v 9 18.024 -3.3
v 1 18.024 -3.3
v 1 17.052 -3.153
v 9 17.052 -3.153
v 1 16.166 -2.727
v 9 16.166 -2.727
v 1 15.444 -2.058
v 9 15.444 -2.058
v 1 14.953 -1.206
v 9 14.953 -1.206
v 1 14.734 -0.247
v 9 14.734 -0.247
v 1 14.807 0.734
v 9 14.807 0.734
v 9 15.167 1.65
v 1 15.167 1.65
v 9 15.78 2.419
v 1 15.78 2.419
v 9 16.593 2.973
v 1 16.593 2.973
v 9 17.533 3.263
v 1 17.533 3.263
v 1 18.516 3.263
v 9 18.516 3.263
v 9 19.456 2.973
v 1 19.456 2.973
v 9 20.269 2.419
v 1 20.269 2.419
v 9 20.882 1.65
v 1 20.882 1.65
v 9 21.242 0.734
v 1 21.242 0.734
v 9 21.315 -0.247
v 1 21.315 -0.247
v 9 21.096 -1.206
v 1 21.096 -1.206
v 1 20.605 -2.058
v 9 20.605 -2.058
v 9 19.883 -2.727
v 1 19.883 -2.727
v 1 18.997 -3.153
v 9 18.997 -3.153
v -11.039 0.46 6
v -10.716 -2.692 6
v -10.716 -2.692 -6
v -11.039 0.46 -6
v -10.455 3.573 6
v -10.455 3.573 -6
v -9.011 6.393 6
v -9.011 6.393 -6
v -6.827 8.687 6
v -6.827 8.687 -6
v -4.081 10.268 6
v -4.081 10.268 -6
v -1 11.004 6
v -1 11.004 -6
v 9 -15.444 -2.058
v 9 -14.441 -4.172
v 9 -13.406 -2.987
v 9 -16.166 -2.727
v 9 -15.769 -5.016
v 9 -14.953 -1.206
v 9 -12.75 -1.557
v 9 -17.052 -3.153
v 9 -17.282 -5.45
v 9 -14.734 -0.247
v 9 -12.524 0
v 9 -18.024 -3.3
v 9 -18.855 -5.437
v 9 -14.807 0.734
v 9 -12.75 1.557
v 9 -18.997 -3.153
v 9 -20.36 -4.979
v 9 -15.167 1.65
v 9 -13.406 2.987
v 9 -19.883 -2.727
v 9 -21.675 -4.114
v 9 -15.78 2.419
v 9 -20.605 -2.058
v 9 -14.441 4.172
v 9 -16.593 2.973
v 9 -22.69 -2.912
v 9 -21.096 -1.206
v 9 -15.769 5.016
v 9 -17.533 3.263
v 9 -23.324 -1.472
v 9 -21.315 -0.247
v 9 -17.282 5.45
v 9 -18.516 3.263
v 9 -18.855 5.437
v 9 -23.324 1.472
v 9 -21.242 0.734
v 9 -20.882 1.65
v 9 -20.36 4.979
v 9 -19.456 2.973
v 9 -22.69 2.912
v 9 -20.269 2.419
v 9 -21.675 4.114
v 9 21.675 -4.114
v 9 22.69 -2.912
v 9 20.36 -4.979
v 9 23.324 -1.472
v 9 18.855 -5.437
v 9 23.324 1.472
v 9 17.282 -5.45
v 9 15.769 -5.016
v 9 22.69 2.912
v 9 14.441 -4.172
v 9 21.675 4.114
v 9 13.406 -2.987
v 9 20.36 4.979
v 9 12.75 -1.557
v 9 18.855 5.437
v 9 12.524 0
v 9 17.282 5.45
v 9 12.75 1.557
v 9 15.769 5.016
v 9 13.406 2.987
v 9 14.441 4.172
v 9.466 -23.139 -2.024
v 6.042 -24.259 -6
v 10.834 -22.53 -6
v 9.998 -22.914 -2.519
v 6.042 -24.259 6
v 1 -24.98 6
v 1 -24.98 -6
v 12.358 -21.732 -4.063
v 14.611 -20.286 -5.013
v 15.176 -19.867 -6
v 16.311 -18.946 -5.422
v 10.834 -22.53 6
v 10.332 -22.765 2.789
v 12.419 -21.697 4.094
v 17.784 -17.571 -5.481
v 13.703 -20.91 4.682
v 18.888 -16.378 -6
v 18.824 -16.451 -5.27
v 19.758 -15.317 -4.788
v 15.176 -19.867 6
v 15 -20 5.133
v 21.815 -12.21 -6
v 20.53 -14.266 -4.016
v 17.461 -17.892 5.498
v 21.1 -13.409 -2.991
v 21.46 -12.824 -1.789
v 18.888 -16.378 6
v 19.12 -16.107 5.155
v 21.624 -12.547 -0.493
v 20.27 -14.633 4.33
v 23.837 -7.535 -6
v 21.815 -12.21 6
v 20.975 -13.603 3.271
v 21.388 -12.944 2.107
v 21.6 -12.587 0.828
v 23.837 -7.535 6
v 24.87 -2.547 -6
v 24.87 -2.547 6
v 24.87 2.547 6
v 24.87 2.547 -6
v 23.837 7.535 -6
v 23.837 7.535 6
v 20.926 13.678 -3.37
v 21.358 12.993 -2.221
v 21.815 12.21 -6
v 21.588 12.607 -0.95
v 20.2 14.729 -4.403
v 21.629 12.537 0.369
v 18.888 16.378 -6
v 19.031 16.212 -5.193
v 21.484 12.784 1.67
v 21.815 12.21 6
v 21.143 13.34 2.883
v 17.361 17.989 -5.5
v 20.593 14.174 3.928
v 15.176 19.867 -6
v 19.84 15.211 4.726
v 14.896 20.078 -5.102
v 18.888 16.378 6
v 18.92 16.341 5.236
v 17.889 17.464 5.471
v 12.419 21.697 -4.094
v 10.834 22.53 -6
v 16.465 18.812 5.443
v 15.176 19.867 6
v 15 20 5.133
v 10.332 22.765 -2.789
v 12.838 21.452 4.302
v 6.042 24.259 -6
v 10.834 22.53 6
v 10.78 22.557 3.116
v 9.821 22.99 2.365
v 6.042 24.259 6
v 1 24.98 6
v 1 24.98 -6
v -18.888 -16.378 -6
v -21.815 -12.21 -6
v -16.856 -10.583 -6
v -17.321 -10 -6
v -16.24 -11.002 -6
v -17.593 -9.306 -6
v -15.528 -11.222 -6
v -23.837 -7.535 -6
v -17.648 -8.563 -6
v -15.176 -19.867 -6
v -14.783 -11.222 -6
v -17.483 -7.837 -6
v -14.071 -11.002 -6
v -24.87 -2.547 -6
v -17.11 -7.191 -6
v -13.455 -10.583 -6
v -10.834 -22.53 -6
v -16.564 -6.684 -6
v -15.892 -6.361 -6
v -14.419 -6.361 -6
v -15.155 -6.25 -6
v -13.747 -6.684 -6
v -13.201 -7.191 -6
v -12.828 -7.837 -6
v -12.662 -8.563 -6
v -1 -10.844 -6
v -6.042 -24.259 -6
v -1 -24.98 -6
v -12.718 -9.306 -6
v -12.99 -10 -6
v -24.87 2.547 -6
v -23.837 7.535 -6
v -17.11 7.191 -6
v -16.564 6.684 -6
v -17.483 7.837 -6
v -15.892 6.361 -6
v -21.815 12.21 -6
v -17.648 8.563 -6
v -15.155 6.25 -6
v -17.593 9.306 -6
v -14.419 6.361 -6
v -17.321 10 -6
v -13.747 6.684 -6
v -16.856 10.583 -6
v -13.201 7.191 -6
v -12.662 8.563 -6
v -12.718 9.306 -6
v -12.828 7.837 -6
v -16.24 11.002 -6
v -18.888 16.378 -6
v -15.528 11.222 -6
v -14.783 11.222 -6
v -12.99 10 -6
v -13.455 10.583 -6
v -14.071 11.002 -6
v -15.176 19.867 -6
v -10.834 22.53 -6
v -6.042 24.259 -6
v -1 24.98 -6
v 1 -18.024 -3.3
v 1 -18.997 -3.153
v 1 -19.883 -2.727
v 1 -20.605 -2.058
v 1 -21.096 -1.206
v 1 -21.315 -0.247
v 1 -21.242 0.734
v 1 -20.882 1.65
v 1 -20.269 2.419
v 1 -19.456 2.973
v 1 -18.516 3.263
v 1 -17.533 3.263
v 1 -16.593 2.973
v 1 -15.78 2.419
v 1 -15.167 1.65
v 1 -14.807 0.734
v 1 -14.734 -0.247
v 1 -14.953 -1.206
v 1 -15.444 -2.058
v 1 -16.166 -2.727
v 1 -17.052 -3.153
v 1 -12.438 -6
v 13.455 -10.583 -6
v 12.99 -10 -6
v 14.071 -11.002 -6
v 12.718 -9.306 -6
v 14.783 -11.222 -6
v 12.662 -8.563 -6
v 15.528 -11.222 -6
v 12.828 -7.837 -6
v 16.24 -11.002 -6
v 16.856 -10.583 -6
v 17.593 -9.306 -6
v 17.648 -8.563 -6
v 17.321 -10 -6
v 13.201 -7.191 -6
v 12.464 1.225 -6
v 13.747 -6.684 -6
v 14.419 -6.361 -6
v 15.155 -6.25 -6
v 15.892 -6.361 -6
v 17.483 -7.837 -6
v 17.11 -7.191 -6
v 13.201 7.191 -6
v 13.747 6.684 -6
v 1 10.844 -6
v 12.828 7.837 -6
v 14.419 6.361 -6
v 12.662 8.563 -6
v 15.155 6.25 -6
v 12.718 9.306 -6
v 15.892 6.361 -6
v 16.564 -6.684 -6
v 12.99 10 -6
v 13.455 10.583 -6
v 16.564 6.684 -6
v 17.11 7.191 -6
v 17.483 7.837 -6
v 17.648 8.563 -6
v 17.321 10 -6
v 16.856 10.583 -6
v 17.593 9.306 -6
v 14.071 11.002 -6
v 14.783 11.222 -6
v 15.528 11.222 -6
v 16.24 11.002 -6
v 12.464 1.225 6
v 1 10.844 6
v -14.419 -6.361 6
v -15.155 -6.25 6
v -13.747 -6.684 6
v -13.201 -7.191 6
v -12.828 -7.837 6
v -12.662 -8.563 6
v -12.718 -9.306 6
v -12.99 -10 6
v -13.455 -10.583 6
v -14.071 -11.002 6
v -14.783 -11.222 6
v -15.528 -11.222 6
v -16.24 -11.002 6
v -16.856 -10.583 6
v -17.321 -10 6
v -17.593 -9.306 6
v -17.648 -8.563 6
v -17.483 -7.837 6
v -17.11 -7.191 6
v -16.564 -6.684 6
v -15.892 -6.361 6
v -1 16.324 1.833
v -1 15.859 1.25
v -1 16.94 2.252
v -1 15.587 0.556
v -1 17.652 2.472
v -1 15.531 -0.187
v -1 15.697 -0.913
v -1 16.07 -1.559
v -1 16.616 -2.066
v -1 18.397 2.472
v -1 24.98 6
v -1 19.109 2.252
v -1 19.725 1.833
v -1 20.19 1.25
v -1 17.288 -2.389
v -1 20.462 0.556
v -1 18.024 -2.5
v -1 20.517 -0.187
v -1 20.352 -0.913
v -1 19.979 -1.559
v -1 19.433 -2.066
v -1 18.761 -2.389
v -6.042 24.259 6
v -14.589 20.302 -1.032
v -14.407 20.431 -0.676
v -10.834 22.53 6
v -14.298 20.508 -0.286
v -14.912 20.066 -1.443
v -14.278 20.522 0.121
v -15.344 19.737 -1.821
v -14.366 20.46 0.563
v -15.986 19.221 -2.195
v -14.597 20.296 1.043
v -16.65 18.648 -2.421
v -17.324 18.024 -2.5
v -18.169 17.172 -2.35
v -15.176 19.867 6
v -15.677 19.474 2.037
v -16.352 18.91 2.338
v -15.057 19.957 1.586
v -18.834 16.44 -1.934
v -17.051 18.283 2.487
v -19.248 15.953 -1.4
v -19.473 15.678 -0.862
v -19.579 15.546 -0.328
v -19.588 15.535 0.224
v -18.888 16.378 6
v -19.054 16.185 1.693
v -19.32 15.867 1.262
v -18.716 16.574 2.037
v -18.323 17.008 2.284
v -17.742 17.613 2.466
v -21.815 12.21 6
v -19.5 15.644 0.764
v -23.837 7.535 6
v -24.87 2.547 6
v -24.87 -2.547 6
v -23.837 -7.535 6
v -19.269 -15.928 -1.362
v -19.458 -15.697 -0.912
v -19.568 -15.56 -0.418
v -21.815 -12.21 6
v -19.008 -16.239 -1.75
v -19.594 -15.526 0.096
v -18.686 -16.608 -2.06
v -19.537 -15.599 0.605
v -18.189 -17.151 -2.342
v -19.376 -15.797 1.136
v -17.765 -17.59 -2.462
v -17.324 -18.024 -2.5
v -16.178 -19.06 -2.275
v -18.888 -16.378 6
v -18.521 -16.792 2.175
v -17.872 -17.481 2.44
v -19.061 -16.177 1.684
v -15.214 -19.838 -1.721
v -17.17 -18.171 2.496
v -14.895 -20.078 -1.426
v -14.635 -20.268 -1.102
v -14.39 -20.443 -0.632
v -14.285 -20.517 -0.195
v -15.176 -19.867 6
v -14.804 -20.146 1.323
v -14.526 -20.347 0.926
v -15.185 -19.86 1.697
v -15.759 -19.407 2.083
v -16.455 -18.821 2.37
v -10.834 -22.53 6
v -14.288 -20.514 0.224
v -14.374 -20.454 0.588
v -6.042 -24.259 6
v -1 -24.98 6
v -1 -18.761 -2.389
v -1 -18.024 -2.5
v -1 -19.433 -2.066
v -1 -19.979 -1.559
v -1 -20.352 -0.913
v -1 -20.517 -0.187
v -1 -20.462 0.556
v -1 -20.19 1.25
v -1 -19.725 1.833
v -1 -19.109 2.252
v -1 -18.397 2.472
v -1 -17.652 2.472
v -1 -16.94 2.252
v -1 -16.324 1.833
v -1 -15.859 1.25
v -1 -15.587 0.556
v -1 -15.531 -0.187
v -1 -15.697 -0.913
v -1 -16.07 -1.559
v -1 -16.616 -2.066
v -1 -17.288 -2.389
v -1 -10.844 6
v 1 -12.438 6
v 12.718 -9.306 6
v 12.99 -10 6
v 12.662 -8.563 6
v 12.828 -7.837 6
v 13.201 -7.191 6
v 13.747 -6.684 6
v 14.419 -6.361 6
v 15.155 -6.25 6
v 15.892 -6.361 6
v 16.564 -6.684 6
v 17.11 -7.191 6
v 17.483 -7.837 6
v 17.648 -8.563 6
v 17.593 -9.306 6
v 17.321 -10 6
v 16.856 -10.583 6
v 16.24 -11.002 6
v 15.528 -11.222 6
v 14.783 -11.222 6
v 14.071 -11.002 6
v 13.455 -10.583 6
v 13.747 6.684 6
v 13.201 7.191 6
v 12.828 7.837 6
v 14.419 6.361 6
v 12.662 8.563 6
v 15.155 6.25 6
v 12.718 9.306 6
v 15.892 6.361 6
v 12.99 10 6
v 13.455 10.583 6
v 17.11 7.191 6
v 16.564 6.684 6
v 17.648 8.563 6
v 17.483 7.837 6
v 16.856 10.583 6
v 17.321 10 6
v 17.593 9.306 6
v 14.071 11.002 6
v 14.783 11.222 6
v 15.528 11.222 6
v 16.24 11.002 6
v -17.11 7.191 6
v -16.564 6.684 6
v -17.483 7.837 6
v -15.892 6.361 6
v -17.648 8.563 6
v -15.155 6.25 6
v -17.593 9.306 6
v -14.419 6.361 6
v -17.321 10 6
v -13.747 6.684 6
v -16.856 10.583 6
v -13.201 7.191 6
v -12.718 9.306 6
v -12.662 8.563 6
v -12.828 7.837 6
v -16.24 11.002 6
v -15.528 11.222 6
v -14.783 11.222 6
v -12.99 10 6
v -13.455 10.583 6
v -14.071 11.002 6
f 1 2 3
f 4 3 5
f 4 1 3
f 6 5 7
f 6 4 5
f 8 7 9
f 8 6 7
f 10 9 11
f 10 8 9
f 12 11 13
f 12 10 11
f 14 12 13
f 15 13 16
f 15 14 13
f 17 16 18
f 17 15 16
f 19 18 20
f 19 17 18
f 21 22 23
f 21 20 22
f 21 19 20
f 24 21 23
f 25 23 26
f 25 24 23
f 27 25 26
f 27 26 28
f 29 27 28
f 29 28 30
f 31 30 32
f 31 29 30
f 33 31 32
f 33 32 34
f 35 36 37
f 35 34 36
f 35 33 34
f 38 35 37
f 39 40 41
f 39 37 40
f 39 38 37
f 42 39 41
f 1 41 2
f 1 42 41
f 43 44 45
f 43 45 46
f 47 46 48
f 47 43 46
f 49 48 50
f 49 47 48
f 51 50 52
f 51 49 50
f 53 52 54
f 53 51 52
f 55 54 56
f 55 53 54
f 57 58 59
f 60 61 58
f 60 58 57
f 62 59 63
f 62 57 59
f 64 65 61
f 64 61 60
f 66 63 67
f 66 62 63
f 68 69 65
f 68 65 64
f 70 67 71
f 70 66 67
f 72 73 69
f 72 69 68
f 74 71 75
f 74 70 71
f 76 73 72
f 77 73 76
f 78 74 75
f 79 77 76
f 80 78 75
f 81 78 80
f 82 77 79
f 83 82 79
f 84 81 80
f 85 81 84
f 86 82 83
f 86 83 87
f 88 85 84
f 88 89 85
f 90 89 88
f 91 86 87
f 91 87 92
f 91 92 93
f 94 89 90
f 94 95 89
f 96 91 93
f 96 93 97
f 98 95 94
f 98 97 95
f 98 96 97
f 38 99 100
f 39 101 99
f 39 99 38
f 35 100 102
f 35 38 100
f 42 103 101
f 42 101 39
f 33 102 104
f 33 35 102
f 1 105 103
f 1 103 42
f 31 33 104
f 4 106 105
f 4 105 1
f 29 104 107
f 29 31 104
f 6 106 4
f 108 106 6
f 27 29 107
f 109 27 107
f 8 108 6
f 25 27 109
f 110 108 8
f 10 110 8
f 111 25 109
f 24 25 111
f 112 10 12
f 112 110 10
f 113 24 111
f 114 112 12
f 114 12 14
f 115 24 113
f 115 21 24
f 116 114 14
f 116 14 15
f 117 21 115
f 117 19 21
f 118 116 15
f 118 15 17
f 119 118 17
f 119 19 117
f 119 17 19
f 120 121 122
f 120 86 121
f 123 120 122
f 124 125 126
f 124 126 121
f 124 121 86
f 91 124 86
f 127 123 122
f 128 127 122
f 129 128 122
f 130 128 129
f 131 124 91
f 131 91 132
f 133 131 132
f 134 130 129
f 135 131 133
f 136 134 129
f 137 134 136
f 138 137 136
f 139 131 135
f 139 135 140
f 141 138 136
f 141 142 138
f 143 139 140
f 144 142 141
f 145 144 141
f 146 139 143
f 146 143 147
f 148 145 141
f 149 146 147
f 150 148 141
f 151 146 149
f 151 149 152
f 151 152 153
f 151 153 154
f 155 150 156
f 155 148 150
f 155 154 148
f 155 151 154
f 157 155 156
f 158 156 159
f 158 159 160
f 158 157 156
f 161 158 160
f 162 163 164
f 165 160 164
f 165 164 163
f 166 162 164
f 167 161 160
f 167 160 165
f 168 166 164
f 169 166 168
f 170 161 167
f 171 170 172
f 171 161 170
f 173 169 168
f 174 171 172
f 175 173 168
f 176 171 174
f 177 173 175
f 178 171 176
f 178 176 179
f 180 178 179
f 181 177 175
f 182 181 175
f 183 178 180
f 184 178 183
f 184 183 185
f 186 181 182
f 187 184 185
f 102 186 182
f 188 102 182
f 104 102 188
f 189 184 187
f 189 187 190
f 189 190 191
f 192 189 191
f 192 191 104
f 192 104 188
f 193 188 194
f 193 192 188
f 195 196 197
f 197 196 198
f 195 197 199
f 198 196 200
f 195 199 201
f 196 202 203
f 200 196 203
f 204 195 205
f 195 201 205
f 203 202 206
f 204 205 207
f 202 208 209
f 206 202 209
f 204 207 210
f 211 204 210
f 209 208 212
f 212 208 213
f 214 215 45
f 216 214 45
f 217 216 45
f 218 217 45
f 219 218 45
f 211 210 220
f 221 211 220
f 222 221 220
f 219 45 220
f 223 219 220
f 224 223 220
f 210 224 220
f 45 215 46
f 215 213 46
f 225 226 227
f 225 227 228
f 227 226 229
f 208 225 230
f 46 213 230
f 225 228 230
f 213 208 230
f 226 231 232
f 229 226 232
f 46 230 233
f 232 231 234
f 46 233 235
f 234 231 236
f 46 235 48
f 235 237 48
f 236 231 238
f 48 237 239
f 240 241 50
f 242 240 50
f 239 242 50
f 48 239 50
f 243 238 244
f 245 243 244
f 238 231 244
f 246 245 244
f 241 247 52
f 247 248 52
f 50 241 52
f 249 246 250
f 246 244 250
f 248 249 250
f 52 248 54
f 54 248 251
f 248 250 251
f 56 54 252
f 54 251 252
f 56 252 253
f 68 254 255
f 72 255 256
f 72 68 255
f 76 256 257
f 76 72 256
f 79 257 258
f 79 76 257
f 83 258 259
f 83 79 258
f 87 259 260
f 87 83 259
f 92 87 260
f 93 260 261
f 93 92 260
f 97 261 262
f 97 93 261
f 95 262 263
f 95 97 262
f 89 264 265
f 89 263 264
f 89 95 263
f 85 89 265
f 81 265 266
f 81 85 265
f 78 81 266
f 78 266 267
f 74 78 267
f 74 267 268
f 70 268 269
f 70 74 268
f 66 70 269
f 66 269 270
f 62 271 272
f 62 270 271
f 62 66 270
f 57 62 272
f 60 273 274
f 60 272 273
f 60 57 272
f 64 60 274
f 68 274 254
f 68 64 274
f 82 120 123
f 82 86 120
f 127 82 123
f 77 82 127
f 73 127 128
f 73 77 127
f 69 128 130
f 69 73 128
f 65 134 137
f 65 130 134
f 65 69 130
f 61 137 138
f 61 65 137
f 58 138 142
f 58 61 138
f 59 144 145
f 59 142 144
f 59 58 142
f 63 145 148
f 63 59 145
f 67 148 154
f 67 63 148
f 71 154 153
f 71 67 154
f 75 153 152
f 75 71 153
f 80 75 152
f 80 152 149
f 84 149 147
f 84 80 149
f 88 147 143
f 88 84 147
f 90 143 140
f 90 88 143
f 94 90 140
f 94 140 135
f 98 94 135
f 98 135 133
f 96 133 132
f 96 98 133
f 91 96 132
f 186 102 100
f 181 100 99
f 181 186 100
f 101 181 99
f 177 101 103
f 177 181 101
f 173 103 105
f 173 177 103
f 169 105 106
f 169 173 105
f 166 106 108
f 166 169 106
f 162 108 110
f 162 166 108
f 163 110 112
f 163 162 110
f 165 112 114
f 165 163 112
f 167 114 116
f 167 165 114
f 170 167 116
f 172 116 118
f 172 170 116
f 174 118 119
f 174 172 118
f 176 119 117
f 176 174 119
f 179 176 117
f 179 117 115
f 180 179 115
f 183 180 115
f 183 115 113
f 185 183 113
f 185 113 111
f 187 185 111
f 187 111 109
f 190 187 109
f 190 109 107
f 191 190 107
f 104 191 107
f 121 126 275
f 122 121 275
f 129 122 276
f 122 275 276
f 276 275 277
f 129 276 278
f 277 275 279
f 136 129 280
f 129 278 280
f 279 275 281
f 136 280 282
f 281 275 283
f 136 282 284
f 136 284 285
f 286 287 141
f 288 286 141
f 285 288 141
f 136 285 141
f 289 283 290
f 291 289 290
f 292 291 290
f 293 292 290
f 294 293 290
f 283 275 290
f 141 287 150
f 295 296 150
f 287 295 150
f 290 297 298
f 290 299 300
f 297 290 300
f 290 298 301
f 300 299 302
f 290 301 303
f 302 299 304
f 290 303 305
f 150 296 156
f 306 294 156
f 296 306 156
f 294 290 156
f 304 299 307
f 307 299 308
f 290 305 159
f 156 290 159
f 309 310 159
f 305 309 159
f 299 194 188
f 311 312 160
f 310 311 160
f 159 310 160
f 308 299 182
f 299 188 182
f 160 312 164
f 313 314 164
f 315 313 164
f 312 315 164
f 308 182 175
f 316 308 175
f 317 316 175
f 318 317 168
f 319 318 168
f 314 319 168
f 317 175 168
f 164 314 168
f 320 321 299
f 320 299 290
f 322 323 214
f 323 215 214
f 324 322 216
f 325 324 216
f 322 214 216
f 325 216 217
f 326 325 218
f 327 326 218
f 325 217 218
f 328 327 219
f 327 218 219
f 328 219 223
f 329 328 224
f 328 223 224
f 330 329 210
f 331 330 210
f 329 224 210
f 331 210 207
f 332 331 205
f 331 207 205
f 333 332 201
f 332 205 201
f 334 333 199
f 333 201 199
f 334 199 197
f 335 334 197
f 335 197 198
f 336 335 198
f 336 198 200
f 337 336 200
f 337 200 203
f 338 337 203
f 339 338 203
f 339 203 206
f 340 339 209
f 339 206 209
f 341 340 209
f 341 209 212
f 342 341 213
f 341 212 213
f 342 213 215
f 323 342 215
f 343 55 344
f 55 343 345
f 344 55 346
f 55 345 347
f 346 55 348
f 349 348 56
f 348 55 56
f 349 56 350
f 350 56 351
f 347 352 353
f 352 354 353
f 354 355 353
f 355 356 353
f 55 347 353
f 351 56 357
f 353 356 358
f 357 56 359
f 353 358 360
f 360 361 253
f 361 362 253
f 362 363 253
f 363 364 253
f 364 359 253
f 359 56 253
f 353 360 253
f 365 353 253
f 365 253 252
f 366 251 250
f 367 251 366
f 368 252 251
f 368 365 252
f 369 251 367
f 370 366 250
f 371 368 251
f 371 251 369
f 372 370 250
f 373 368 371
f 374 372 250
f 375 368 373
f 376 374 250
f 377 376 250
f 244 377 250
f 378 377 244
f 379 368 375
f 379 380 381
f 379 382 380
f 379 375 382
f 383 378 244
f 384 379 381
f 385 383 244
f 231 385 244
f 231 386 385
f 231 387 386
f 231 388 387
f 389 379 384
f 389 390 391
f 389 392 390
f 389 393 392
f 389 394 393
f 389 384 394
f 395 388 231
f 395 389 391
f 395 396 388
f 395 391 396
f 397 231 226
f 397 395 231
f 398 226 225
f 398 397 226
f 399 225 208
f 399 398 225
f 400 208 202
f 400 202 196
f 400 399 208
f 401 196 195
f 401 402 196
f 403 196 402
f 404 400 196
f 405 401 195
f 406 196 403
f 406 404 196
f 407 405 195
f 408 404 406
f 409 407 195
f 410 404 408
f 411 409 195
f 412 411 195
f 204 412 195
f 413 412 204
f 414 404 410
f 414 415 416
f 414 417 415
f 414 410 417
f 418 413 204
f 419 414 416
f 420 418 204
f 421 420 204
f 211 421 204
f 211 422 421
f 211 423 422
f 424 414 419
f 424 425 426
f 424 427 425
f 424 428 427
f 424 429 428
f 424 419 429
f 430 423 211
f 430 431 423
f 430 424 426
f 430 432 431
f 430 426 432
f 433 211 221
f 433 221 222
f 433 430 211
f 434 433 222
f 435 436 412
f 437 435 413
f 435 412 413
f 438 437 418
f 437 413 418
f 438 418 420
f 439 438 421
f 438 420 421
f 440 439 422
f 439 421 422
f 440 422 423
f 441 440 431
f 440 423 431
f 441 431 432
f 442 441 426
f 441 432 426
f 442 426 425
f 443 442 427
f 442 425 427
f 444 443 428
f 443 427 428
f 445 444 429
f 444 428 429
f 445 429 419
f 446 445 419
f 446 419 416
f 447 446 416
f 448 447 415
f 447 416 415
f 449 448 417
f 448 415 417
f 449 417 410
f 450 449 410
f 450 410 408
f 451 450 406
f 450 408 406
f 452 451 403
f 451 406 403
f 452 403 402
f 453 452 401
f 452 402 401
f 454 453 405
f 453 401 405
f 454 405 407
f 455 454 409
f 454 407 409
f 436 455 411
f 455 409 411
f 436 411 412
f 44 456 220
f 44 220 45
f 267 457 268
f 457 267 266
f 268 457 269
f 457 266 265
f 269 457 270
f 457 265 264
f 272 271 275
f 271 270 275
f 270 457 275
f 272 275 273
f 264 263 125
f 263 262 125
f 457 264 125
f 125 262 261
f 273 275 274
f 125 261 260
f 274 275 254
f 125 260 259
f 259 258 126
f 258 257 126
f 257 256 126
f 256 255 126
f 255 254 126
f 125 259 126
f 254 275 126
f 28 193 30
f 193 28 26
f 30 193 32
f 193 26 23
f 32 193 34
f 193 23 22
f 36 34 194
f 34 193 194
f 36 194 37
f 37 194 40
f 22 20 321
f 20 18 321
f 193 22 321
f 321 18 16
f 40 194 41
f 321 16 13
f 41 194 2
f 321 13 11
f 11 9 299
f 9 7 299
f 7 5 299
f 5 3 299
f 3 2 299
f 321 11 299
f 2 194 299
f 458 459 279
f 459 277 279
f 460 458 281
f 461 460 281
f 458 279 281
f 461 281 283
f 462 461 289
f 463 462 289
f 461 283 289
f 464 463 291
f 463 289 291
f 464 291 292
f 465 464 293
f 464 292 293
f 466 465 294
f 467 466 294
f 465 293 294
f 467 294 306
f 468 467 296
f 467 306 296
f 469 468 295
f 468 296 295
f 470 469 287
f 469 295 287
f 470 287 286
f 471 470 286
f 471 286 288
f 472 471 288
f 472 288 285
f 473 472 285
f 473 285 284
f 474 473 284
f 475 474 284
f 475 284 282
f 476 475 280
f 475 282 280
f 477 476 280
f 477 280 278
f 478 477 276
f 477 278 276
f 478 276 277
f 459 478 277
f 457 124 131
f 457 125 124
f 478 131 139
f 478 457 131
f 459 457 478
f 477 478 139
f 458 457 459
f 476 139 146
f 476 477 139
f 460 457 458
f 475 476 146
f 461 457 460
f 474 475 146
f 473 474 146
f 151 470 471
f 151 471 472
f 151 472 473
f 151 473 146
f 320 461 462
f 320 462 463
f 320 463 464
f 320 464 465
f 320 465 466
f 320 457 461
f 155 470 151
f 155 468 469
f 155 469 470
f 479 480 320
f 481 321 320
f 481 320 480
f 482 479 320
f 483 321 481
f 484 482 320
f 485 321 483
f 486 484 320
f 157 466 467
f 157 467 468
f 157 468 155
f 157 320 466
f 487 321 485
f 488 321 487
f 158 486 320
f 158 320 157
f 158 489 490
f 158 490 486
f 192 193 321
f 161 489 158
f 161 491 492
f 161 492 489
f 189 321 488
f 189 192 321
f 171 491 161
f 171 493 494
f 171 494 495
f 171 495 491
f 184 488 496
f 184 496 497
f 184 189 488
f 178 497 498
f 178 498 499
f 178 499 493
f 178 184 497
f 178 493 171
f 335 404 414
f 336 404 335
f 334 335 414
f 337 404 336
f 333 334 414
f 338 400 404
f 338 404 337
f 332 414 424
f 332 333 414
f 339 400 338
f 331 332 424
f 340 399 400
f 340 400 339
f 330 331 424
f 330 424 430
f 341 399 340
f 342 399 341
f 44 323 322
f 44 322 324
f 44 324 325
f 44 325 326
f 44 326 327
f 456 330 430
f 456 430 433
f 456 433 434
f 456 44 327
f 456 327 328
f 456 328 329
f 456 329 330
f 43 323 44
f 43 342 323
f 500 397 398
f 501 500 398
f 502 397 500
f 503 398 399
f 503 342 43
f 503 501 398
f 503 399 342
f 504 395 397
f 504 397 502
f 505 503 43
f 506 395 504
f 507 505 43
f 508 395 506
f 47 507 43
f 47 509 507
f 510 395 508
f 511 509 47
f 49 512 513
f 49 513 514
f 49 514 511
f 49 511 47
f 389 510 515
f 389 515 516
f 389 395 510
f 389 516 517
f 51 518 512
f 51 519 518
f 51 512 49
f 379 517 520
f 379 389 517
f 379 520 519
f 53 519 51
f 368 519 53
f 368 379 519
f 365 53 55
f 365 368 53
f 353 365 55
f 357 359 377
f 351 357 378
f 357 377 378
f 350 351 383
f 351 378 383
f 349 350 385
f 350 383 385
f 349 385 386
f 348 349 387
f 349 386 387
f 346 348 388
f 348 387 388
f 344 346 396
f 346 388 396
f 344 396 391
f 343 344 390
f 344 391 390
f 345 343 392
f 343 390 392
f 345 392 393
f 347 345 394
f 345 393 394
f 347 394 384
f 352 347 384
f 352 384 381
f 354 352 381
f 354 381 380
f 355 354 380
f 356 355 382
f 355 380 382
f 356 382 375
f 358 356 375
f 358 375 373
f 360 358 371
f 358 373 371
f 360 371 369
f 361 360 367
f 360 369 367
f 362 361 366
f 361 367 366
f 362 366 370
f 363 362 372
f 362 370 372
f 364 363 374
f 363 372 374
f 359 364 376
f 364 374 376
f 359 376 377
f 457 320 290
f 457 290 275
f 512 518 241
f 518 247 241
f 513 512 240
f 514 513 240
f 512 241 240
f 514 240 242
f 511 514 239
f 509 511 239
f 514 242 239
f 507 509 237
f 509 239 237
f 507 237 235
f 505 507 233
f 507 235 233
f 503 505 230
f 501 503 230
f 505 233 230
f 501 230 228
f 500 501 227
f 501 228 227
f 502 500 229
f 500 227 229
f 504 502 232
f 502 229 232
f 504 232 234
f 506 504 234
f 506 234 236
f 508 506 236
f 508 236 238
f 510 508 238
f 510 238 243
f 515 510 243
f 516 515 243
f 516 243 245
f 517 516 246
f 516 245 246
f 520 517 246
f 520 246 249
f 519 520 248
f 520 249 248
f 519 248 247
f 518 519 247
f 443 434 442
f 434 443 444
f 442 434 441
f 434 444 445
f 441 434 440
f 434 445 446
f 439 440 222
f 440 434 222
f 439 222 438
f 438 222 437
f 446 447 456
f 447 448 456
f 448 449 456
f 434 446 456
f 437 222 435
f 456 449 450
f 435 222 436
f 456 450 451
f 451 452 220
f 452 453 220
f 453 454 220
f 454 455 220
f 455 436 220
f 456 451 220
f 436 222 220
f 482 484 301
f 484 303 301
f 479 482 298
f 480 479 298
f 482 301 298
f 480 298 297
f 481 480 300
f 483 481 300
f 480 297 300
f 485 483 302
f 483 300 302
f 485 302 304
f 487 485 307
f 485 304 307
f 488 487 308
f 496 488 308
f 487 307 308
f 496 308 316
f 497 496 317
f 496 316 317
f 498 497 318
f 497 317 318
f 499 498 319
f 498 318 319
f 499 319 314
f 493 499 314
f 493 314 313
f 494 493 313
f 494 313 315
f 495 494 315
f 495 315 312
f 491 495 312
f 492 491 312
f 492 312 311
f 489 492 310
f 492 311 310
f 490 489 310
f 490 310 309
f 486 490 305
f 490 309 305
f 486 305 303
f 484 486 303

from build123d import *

# Parameters (mm, degrees)
SKETCH_7_R                  = 25
EXTRUDE_1_DEPTH             = 6
CUT_EXTRUDE_1_DEPTH         = 36.860842154
CUT_EXTRUDE_1_DEPTH_BACK    = 36.860842154
SKETCH_18_W                 = 2.5
SKETCH_18_H                 = 12
PATTERN_CIRCULAR_2_COUNT    = 6
HOLE_WIZARD_M6_1_AT_2_COUNT = 2
HOLE_WIZARD_M6_1_AT_2_PITCH = 36.048949672
SKETCH_29_W                 = 2.5
SKETCH_29_H                 = 40
M6X1_0_3_AT_2_COUNT         = 2
M6X1_0_3_AT_2_PITCH         = 36.048949672
SKETCH_30_R                 = 5.5
CUT_EXTRUDE_2_DEPTH         = 48.539457445


with BuildPart() as part:
    # 스케치7 → 보스-돌출1 (new, symmetric)
    with BuildSketch(Plane.XY):
        Circle(SKETCH_7_R)
        with BuildLine():
            Line((12.464303027, 1.224603167), (0.958404813, -12.487592365))
            Line((0.958404813, -12.487592365), (-10.7161125, -2.691509193))
            ThreePointArc((-10.7161125, -2.691509193), (-8.463986498, 7.102127949), (0.789785713, 11.020686339))
            Line((0.789785713, 11.020686339), (12.464303027, 1.224603167))
        make_face(mode=Mode.SUBTRACT)
    extrude(amount=EXTRUDE_1_DEPTH, both=True)

    # 스케치19 → 컷-돌출1 (cut, two sides: drawn at the far end of the back side and taken through both)
    with BuildSketch(Plane.XY.offset(-CUT_EXTRUDE_1_DEPTH_BACK)):
        with BuildLine():
            Line((1, 24.979991994), (1, -24.979991994))
            ThreePointArc((1, -24.979991994), (0, -25), (-1, -24.979991994))
            Line((-1, -24.979991994), (-1, 24.979991994))
            ThreePointArc((-1, 24.979991994), (0, 25), (1, 24.979991994))
        make_face()
    extrude(amount=CUT_EXTRUDE_1_DEPTH + CUT_EXTRUDE_1_DEPTH_BACK, mode=Mode.SUBTRACT)


with BuildPart() as cut_extrude_1_piece_1:
    # of the separate pieces the step leaves, piece 1, a body of its own (cut_extrude_1_pieces)
    add(part.part.solids().sort_by_distance((1, 24.979991994, 6))[0])

    # 스케치18 → M6x1.0 나사 구멍1 (revolve, cut)
    with BuildSketch(Plane(origin=(15.155444566, 8.75, 6), x_dir=(0, -1, 0), z_dir=(1, 0, 0))):
        with Locations((1.25, 6)):
            Rectangle(SKETCH_18_W, SKETCH_18_H)
    m6x1_0_1 = revolve(axis=Axis((15.155444566, 8.75, 12.35), (0, 0, -1)), mode=Mode.SUBTRACT)


with BuildPart() as cut_extrude_1_piece_2:
    # of the separate pieces the step leaves, piece 2, a body of its own (cut_extrude_1_pieces)
    add(part.part.solids().sort_by_distance((-1, 24.979991994, -6))[0])


with BuildPart() as pattern_circular_2_tool:
    # 원형 패턴2: M6x1.0 나사 구멍1 ×6 about axis, 2 skipped
    pattern_circular_2_axis = Axis((0, 0, 0), (0, 0, -1))
    add([m6x1_0_1.rotate(pattern_circular_2_axis, i * 360 / PATTERN_CIRCULAR_2_COUNT) for i in range(1, PATTERN_CIRCULAR_2_COUNT) if i not in (2, 5)])


with BuildPart() as cut_extrude_1_piece_1_1:
    add(cut_extrude_1_piece_1.part)

    # 원형 패턴2: cut by pattern_circular_2_tool
    add(pattern_circular_2_tool.part, mode=Mode.SUBTRACT)

    # 스케치23 → M6 소켓 머리 캡 나사용 카운터보어1 (revolve, cut)
    with BuildSketch(Plane(origin=(15, 18.024474836, 0), x_dir=(0, 0, -1), z_dir=(0, 1, 0))):
        Polygon((0, 0), (0, 40), (3.3, 40), (3.3, 6), (5.5, 6), (5.5, 0), align=None)
    hole_wizard_m6_1 = revolve(axis=Axis((21.35, 18.024474836, 0), (-1, 0, 0)), mode=Mode.SUBTRACT)

    # M6 소켓 머리 캡 나사용 카운터보어1 at 2: M6 소켓 머리 캡 나사용 카운터보어1 ×2
    with Locations(*[(0, -i * HOLE_WIZARD_M6_1_AT_2_PITCH, 0) for i in range(1, HOLE_WIZARD_M6_1_AT_2_COUNT)]):
        add(hole_wizard_m6_1, mode=Mode.SUBTRACT)

    # 스케치30 → 컷-돌출2 (cut, through all)
    with BuildSketch(Plane(origin=(15, 0, 0), x_dir=(0, 0, -1), z_dir=(1, 0, 0))):
        with Locations((0, 18.024474836)):
            Circle(SKETCH_30_R)
        with Locations((0, -18.024474836)):
            Circle(SKETCH_30_R)
    extrude(amount=CUT_EXTRUDE_2_DEPTH, mode=Mode.SUBTRACT)


with BuildPart() as cut_extrude_1_piece_2_1:
    add(cut_extrude_1_piece_2.part)

    # 원형 패턴2: cut by pattern_circular_2_tool
    add(pattern_circular_2_tool.part, mode=Mode.SUBTRACT)

    # 스케치29 → M6x1.0 나사 구멍3 (revolve, cut)
    with BuildSketch(Plane(origin=(15, 18.024474836, 0), x_dir=(0, 0, -1), z_dir=(0, 1, 0))):
        with Locations((1.25, 20)):
            Rectangle(SKETCH_29_W, SKETCH_29_H)
    m6x1_0_3 = revolve(axis=Axis((21.35, 18.024474836, 0), (-1, 0, 0)), mode=Mode.SUBTRACT)

    # M6x1.0 나사 구멍3 at 2: M6x1.0 나사 구멍3 ×2
    with Locations(*[(0, -i * M6X1_0_3_AT_2_PITCH, 0) for i in range(1, M6X1_0_3_AT_2_COUNT)]):
        add(m6x1_0_3, mode=Mode.SUBTRACT)


solid = Compound([cut_extrude_1_piece_1_1.part, cut_extrude_1_piece_2_1.part])
